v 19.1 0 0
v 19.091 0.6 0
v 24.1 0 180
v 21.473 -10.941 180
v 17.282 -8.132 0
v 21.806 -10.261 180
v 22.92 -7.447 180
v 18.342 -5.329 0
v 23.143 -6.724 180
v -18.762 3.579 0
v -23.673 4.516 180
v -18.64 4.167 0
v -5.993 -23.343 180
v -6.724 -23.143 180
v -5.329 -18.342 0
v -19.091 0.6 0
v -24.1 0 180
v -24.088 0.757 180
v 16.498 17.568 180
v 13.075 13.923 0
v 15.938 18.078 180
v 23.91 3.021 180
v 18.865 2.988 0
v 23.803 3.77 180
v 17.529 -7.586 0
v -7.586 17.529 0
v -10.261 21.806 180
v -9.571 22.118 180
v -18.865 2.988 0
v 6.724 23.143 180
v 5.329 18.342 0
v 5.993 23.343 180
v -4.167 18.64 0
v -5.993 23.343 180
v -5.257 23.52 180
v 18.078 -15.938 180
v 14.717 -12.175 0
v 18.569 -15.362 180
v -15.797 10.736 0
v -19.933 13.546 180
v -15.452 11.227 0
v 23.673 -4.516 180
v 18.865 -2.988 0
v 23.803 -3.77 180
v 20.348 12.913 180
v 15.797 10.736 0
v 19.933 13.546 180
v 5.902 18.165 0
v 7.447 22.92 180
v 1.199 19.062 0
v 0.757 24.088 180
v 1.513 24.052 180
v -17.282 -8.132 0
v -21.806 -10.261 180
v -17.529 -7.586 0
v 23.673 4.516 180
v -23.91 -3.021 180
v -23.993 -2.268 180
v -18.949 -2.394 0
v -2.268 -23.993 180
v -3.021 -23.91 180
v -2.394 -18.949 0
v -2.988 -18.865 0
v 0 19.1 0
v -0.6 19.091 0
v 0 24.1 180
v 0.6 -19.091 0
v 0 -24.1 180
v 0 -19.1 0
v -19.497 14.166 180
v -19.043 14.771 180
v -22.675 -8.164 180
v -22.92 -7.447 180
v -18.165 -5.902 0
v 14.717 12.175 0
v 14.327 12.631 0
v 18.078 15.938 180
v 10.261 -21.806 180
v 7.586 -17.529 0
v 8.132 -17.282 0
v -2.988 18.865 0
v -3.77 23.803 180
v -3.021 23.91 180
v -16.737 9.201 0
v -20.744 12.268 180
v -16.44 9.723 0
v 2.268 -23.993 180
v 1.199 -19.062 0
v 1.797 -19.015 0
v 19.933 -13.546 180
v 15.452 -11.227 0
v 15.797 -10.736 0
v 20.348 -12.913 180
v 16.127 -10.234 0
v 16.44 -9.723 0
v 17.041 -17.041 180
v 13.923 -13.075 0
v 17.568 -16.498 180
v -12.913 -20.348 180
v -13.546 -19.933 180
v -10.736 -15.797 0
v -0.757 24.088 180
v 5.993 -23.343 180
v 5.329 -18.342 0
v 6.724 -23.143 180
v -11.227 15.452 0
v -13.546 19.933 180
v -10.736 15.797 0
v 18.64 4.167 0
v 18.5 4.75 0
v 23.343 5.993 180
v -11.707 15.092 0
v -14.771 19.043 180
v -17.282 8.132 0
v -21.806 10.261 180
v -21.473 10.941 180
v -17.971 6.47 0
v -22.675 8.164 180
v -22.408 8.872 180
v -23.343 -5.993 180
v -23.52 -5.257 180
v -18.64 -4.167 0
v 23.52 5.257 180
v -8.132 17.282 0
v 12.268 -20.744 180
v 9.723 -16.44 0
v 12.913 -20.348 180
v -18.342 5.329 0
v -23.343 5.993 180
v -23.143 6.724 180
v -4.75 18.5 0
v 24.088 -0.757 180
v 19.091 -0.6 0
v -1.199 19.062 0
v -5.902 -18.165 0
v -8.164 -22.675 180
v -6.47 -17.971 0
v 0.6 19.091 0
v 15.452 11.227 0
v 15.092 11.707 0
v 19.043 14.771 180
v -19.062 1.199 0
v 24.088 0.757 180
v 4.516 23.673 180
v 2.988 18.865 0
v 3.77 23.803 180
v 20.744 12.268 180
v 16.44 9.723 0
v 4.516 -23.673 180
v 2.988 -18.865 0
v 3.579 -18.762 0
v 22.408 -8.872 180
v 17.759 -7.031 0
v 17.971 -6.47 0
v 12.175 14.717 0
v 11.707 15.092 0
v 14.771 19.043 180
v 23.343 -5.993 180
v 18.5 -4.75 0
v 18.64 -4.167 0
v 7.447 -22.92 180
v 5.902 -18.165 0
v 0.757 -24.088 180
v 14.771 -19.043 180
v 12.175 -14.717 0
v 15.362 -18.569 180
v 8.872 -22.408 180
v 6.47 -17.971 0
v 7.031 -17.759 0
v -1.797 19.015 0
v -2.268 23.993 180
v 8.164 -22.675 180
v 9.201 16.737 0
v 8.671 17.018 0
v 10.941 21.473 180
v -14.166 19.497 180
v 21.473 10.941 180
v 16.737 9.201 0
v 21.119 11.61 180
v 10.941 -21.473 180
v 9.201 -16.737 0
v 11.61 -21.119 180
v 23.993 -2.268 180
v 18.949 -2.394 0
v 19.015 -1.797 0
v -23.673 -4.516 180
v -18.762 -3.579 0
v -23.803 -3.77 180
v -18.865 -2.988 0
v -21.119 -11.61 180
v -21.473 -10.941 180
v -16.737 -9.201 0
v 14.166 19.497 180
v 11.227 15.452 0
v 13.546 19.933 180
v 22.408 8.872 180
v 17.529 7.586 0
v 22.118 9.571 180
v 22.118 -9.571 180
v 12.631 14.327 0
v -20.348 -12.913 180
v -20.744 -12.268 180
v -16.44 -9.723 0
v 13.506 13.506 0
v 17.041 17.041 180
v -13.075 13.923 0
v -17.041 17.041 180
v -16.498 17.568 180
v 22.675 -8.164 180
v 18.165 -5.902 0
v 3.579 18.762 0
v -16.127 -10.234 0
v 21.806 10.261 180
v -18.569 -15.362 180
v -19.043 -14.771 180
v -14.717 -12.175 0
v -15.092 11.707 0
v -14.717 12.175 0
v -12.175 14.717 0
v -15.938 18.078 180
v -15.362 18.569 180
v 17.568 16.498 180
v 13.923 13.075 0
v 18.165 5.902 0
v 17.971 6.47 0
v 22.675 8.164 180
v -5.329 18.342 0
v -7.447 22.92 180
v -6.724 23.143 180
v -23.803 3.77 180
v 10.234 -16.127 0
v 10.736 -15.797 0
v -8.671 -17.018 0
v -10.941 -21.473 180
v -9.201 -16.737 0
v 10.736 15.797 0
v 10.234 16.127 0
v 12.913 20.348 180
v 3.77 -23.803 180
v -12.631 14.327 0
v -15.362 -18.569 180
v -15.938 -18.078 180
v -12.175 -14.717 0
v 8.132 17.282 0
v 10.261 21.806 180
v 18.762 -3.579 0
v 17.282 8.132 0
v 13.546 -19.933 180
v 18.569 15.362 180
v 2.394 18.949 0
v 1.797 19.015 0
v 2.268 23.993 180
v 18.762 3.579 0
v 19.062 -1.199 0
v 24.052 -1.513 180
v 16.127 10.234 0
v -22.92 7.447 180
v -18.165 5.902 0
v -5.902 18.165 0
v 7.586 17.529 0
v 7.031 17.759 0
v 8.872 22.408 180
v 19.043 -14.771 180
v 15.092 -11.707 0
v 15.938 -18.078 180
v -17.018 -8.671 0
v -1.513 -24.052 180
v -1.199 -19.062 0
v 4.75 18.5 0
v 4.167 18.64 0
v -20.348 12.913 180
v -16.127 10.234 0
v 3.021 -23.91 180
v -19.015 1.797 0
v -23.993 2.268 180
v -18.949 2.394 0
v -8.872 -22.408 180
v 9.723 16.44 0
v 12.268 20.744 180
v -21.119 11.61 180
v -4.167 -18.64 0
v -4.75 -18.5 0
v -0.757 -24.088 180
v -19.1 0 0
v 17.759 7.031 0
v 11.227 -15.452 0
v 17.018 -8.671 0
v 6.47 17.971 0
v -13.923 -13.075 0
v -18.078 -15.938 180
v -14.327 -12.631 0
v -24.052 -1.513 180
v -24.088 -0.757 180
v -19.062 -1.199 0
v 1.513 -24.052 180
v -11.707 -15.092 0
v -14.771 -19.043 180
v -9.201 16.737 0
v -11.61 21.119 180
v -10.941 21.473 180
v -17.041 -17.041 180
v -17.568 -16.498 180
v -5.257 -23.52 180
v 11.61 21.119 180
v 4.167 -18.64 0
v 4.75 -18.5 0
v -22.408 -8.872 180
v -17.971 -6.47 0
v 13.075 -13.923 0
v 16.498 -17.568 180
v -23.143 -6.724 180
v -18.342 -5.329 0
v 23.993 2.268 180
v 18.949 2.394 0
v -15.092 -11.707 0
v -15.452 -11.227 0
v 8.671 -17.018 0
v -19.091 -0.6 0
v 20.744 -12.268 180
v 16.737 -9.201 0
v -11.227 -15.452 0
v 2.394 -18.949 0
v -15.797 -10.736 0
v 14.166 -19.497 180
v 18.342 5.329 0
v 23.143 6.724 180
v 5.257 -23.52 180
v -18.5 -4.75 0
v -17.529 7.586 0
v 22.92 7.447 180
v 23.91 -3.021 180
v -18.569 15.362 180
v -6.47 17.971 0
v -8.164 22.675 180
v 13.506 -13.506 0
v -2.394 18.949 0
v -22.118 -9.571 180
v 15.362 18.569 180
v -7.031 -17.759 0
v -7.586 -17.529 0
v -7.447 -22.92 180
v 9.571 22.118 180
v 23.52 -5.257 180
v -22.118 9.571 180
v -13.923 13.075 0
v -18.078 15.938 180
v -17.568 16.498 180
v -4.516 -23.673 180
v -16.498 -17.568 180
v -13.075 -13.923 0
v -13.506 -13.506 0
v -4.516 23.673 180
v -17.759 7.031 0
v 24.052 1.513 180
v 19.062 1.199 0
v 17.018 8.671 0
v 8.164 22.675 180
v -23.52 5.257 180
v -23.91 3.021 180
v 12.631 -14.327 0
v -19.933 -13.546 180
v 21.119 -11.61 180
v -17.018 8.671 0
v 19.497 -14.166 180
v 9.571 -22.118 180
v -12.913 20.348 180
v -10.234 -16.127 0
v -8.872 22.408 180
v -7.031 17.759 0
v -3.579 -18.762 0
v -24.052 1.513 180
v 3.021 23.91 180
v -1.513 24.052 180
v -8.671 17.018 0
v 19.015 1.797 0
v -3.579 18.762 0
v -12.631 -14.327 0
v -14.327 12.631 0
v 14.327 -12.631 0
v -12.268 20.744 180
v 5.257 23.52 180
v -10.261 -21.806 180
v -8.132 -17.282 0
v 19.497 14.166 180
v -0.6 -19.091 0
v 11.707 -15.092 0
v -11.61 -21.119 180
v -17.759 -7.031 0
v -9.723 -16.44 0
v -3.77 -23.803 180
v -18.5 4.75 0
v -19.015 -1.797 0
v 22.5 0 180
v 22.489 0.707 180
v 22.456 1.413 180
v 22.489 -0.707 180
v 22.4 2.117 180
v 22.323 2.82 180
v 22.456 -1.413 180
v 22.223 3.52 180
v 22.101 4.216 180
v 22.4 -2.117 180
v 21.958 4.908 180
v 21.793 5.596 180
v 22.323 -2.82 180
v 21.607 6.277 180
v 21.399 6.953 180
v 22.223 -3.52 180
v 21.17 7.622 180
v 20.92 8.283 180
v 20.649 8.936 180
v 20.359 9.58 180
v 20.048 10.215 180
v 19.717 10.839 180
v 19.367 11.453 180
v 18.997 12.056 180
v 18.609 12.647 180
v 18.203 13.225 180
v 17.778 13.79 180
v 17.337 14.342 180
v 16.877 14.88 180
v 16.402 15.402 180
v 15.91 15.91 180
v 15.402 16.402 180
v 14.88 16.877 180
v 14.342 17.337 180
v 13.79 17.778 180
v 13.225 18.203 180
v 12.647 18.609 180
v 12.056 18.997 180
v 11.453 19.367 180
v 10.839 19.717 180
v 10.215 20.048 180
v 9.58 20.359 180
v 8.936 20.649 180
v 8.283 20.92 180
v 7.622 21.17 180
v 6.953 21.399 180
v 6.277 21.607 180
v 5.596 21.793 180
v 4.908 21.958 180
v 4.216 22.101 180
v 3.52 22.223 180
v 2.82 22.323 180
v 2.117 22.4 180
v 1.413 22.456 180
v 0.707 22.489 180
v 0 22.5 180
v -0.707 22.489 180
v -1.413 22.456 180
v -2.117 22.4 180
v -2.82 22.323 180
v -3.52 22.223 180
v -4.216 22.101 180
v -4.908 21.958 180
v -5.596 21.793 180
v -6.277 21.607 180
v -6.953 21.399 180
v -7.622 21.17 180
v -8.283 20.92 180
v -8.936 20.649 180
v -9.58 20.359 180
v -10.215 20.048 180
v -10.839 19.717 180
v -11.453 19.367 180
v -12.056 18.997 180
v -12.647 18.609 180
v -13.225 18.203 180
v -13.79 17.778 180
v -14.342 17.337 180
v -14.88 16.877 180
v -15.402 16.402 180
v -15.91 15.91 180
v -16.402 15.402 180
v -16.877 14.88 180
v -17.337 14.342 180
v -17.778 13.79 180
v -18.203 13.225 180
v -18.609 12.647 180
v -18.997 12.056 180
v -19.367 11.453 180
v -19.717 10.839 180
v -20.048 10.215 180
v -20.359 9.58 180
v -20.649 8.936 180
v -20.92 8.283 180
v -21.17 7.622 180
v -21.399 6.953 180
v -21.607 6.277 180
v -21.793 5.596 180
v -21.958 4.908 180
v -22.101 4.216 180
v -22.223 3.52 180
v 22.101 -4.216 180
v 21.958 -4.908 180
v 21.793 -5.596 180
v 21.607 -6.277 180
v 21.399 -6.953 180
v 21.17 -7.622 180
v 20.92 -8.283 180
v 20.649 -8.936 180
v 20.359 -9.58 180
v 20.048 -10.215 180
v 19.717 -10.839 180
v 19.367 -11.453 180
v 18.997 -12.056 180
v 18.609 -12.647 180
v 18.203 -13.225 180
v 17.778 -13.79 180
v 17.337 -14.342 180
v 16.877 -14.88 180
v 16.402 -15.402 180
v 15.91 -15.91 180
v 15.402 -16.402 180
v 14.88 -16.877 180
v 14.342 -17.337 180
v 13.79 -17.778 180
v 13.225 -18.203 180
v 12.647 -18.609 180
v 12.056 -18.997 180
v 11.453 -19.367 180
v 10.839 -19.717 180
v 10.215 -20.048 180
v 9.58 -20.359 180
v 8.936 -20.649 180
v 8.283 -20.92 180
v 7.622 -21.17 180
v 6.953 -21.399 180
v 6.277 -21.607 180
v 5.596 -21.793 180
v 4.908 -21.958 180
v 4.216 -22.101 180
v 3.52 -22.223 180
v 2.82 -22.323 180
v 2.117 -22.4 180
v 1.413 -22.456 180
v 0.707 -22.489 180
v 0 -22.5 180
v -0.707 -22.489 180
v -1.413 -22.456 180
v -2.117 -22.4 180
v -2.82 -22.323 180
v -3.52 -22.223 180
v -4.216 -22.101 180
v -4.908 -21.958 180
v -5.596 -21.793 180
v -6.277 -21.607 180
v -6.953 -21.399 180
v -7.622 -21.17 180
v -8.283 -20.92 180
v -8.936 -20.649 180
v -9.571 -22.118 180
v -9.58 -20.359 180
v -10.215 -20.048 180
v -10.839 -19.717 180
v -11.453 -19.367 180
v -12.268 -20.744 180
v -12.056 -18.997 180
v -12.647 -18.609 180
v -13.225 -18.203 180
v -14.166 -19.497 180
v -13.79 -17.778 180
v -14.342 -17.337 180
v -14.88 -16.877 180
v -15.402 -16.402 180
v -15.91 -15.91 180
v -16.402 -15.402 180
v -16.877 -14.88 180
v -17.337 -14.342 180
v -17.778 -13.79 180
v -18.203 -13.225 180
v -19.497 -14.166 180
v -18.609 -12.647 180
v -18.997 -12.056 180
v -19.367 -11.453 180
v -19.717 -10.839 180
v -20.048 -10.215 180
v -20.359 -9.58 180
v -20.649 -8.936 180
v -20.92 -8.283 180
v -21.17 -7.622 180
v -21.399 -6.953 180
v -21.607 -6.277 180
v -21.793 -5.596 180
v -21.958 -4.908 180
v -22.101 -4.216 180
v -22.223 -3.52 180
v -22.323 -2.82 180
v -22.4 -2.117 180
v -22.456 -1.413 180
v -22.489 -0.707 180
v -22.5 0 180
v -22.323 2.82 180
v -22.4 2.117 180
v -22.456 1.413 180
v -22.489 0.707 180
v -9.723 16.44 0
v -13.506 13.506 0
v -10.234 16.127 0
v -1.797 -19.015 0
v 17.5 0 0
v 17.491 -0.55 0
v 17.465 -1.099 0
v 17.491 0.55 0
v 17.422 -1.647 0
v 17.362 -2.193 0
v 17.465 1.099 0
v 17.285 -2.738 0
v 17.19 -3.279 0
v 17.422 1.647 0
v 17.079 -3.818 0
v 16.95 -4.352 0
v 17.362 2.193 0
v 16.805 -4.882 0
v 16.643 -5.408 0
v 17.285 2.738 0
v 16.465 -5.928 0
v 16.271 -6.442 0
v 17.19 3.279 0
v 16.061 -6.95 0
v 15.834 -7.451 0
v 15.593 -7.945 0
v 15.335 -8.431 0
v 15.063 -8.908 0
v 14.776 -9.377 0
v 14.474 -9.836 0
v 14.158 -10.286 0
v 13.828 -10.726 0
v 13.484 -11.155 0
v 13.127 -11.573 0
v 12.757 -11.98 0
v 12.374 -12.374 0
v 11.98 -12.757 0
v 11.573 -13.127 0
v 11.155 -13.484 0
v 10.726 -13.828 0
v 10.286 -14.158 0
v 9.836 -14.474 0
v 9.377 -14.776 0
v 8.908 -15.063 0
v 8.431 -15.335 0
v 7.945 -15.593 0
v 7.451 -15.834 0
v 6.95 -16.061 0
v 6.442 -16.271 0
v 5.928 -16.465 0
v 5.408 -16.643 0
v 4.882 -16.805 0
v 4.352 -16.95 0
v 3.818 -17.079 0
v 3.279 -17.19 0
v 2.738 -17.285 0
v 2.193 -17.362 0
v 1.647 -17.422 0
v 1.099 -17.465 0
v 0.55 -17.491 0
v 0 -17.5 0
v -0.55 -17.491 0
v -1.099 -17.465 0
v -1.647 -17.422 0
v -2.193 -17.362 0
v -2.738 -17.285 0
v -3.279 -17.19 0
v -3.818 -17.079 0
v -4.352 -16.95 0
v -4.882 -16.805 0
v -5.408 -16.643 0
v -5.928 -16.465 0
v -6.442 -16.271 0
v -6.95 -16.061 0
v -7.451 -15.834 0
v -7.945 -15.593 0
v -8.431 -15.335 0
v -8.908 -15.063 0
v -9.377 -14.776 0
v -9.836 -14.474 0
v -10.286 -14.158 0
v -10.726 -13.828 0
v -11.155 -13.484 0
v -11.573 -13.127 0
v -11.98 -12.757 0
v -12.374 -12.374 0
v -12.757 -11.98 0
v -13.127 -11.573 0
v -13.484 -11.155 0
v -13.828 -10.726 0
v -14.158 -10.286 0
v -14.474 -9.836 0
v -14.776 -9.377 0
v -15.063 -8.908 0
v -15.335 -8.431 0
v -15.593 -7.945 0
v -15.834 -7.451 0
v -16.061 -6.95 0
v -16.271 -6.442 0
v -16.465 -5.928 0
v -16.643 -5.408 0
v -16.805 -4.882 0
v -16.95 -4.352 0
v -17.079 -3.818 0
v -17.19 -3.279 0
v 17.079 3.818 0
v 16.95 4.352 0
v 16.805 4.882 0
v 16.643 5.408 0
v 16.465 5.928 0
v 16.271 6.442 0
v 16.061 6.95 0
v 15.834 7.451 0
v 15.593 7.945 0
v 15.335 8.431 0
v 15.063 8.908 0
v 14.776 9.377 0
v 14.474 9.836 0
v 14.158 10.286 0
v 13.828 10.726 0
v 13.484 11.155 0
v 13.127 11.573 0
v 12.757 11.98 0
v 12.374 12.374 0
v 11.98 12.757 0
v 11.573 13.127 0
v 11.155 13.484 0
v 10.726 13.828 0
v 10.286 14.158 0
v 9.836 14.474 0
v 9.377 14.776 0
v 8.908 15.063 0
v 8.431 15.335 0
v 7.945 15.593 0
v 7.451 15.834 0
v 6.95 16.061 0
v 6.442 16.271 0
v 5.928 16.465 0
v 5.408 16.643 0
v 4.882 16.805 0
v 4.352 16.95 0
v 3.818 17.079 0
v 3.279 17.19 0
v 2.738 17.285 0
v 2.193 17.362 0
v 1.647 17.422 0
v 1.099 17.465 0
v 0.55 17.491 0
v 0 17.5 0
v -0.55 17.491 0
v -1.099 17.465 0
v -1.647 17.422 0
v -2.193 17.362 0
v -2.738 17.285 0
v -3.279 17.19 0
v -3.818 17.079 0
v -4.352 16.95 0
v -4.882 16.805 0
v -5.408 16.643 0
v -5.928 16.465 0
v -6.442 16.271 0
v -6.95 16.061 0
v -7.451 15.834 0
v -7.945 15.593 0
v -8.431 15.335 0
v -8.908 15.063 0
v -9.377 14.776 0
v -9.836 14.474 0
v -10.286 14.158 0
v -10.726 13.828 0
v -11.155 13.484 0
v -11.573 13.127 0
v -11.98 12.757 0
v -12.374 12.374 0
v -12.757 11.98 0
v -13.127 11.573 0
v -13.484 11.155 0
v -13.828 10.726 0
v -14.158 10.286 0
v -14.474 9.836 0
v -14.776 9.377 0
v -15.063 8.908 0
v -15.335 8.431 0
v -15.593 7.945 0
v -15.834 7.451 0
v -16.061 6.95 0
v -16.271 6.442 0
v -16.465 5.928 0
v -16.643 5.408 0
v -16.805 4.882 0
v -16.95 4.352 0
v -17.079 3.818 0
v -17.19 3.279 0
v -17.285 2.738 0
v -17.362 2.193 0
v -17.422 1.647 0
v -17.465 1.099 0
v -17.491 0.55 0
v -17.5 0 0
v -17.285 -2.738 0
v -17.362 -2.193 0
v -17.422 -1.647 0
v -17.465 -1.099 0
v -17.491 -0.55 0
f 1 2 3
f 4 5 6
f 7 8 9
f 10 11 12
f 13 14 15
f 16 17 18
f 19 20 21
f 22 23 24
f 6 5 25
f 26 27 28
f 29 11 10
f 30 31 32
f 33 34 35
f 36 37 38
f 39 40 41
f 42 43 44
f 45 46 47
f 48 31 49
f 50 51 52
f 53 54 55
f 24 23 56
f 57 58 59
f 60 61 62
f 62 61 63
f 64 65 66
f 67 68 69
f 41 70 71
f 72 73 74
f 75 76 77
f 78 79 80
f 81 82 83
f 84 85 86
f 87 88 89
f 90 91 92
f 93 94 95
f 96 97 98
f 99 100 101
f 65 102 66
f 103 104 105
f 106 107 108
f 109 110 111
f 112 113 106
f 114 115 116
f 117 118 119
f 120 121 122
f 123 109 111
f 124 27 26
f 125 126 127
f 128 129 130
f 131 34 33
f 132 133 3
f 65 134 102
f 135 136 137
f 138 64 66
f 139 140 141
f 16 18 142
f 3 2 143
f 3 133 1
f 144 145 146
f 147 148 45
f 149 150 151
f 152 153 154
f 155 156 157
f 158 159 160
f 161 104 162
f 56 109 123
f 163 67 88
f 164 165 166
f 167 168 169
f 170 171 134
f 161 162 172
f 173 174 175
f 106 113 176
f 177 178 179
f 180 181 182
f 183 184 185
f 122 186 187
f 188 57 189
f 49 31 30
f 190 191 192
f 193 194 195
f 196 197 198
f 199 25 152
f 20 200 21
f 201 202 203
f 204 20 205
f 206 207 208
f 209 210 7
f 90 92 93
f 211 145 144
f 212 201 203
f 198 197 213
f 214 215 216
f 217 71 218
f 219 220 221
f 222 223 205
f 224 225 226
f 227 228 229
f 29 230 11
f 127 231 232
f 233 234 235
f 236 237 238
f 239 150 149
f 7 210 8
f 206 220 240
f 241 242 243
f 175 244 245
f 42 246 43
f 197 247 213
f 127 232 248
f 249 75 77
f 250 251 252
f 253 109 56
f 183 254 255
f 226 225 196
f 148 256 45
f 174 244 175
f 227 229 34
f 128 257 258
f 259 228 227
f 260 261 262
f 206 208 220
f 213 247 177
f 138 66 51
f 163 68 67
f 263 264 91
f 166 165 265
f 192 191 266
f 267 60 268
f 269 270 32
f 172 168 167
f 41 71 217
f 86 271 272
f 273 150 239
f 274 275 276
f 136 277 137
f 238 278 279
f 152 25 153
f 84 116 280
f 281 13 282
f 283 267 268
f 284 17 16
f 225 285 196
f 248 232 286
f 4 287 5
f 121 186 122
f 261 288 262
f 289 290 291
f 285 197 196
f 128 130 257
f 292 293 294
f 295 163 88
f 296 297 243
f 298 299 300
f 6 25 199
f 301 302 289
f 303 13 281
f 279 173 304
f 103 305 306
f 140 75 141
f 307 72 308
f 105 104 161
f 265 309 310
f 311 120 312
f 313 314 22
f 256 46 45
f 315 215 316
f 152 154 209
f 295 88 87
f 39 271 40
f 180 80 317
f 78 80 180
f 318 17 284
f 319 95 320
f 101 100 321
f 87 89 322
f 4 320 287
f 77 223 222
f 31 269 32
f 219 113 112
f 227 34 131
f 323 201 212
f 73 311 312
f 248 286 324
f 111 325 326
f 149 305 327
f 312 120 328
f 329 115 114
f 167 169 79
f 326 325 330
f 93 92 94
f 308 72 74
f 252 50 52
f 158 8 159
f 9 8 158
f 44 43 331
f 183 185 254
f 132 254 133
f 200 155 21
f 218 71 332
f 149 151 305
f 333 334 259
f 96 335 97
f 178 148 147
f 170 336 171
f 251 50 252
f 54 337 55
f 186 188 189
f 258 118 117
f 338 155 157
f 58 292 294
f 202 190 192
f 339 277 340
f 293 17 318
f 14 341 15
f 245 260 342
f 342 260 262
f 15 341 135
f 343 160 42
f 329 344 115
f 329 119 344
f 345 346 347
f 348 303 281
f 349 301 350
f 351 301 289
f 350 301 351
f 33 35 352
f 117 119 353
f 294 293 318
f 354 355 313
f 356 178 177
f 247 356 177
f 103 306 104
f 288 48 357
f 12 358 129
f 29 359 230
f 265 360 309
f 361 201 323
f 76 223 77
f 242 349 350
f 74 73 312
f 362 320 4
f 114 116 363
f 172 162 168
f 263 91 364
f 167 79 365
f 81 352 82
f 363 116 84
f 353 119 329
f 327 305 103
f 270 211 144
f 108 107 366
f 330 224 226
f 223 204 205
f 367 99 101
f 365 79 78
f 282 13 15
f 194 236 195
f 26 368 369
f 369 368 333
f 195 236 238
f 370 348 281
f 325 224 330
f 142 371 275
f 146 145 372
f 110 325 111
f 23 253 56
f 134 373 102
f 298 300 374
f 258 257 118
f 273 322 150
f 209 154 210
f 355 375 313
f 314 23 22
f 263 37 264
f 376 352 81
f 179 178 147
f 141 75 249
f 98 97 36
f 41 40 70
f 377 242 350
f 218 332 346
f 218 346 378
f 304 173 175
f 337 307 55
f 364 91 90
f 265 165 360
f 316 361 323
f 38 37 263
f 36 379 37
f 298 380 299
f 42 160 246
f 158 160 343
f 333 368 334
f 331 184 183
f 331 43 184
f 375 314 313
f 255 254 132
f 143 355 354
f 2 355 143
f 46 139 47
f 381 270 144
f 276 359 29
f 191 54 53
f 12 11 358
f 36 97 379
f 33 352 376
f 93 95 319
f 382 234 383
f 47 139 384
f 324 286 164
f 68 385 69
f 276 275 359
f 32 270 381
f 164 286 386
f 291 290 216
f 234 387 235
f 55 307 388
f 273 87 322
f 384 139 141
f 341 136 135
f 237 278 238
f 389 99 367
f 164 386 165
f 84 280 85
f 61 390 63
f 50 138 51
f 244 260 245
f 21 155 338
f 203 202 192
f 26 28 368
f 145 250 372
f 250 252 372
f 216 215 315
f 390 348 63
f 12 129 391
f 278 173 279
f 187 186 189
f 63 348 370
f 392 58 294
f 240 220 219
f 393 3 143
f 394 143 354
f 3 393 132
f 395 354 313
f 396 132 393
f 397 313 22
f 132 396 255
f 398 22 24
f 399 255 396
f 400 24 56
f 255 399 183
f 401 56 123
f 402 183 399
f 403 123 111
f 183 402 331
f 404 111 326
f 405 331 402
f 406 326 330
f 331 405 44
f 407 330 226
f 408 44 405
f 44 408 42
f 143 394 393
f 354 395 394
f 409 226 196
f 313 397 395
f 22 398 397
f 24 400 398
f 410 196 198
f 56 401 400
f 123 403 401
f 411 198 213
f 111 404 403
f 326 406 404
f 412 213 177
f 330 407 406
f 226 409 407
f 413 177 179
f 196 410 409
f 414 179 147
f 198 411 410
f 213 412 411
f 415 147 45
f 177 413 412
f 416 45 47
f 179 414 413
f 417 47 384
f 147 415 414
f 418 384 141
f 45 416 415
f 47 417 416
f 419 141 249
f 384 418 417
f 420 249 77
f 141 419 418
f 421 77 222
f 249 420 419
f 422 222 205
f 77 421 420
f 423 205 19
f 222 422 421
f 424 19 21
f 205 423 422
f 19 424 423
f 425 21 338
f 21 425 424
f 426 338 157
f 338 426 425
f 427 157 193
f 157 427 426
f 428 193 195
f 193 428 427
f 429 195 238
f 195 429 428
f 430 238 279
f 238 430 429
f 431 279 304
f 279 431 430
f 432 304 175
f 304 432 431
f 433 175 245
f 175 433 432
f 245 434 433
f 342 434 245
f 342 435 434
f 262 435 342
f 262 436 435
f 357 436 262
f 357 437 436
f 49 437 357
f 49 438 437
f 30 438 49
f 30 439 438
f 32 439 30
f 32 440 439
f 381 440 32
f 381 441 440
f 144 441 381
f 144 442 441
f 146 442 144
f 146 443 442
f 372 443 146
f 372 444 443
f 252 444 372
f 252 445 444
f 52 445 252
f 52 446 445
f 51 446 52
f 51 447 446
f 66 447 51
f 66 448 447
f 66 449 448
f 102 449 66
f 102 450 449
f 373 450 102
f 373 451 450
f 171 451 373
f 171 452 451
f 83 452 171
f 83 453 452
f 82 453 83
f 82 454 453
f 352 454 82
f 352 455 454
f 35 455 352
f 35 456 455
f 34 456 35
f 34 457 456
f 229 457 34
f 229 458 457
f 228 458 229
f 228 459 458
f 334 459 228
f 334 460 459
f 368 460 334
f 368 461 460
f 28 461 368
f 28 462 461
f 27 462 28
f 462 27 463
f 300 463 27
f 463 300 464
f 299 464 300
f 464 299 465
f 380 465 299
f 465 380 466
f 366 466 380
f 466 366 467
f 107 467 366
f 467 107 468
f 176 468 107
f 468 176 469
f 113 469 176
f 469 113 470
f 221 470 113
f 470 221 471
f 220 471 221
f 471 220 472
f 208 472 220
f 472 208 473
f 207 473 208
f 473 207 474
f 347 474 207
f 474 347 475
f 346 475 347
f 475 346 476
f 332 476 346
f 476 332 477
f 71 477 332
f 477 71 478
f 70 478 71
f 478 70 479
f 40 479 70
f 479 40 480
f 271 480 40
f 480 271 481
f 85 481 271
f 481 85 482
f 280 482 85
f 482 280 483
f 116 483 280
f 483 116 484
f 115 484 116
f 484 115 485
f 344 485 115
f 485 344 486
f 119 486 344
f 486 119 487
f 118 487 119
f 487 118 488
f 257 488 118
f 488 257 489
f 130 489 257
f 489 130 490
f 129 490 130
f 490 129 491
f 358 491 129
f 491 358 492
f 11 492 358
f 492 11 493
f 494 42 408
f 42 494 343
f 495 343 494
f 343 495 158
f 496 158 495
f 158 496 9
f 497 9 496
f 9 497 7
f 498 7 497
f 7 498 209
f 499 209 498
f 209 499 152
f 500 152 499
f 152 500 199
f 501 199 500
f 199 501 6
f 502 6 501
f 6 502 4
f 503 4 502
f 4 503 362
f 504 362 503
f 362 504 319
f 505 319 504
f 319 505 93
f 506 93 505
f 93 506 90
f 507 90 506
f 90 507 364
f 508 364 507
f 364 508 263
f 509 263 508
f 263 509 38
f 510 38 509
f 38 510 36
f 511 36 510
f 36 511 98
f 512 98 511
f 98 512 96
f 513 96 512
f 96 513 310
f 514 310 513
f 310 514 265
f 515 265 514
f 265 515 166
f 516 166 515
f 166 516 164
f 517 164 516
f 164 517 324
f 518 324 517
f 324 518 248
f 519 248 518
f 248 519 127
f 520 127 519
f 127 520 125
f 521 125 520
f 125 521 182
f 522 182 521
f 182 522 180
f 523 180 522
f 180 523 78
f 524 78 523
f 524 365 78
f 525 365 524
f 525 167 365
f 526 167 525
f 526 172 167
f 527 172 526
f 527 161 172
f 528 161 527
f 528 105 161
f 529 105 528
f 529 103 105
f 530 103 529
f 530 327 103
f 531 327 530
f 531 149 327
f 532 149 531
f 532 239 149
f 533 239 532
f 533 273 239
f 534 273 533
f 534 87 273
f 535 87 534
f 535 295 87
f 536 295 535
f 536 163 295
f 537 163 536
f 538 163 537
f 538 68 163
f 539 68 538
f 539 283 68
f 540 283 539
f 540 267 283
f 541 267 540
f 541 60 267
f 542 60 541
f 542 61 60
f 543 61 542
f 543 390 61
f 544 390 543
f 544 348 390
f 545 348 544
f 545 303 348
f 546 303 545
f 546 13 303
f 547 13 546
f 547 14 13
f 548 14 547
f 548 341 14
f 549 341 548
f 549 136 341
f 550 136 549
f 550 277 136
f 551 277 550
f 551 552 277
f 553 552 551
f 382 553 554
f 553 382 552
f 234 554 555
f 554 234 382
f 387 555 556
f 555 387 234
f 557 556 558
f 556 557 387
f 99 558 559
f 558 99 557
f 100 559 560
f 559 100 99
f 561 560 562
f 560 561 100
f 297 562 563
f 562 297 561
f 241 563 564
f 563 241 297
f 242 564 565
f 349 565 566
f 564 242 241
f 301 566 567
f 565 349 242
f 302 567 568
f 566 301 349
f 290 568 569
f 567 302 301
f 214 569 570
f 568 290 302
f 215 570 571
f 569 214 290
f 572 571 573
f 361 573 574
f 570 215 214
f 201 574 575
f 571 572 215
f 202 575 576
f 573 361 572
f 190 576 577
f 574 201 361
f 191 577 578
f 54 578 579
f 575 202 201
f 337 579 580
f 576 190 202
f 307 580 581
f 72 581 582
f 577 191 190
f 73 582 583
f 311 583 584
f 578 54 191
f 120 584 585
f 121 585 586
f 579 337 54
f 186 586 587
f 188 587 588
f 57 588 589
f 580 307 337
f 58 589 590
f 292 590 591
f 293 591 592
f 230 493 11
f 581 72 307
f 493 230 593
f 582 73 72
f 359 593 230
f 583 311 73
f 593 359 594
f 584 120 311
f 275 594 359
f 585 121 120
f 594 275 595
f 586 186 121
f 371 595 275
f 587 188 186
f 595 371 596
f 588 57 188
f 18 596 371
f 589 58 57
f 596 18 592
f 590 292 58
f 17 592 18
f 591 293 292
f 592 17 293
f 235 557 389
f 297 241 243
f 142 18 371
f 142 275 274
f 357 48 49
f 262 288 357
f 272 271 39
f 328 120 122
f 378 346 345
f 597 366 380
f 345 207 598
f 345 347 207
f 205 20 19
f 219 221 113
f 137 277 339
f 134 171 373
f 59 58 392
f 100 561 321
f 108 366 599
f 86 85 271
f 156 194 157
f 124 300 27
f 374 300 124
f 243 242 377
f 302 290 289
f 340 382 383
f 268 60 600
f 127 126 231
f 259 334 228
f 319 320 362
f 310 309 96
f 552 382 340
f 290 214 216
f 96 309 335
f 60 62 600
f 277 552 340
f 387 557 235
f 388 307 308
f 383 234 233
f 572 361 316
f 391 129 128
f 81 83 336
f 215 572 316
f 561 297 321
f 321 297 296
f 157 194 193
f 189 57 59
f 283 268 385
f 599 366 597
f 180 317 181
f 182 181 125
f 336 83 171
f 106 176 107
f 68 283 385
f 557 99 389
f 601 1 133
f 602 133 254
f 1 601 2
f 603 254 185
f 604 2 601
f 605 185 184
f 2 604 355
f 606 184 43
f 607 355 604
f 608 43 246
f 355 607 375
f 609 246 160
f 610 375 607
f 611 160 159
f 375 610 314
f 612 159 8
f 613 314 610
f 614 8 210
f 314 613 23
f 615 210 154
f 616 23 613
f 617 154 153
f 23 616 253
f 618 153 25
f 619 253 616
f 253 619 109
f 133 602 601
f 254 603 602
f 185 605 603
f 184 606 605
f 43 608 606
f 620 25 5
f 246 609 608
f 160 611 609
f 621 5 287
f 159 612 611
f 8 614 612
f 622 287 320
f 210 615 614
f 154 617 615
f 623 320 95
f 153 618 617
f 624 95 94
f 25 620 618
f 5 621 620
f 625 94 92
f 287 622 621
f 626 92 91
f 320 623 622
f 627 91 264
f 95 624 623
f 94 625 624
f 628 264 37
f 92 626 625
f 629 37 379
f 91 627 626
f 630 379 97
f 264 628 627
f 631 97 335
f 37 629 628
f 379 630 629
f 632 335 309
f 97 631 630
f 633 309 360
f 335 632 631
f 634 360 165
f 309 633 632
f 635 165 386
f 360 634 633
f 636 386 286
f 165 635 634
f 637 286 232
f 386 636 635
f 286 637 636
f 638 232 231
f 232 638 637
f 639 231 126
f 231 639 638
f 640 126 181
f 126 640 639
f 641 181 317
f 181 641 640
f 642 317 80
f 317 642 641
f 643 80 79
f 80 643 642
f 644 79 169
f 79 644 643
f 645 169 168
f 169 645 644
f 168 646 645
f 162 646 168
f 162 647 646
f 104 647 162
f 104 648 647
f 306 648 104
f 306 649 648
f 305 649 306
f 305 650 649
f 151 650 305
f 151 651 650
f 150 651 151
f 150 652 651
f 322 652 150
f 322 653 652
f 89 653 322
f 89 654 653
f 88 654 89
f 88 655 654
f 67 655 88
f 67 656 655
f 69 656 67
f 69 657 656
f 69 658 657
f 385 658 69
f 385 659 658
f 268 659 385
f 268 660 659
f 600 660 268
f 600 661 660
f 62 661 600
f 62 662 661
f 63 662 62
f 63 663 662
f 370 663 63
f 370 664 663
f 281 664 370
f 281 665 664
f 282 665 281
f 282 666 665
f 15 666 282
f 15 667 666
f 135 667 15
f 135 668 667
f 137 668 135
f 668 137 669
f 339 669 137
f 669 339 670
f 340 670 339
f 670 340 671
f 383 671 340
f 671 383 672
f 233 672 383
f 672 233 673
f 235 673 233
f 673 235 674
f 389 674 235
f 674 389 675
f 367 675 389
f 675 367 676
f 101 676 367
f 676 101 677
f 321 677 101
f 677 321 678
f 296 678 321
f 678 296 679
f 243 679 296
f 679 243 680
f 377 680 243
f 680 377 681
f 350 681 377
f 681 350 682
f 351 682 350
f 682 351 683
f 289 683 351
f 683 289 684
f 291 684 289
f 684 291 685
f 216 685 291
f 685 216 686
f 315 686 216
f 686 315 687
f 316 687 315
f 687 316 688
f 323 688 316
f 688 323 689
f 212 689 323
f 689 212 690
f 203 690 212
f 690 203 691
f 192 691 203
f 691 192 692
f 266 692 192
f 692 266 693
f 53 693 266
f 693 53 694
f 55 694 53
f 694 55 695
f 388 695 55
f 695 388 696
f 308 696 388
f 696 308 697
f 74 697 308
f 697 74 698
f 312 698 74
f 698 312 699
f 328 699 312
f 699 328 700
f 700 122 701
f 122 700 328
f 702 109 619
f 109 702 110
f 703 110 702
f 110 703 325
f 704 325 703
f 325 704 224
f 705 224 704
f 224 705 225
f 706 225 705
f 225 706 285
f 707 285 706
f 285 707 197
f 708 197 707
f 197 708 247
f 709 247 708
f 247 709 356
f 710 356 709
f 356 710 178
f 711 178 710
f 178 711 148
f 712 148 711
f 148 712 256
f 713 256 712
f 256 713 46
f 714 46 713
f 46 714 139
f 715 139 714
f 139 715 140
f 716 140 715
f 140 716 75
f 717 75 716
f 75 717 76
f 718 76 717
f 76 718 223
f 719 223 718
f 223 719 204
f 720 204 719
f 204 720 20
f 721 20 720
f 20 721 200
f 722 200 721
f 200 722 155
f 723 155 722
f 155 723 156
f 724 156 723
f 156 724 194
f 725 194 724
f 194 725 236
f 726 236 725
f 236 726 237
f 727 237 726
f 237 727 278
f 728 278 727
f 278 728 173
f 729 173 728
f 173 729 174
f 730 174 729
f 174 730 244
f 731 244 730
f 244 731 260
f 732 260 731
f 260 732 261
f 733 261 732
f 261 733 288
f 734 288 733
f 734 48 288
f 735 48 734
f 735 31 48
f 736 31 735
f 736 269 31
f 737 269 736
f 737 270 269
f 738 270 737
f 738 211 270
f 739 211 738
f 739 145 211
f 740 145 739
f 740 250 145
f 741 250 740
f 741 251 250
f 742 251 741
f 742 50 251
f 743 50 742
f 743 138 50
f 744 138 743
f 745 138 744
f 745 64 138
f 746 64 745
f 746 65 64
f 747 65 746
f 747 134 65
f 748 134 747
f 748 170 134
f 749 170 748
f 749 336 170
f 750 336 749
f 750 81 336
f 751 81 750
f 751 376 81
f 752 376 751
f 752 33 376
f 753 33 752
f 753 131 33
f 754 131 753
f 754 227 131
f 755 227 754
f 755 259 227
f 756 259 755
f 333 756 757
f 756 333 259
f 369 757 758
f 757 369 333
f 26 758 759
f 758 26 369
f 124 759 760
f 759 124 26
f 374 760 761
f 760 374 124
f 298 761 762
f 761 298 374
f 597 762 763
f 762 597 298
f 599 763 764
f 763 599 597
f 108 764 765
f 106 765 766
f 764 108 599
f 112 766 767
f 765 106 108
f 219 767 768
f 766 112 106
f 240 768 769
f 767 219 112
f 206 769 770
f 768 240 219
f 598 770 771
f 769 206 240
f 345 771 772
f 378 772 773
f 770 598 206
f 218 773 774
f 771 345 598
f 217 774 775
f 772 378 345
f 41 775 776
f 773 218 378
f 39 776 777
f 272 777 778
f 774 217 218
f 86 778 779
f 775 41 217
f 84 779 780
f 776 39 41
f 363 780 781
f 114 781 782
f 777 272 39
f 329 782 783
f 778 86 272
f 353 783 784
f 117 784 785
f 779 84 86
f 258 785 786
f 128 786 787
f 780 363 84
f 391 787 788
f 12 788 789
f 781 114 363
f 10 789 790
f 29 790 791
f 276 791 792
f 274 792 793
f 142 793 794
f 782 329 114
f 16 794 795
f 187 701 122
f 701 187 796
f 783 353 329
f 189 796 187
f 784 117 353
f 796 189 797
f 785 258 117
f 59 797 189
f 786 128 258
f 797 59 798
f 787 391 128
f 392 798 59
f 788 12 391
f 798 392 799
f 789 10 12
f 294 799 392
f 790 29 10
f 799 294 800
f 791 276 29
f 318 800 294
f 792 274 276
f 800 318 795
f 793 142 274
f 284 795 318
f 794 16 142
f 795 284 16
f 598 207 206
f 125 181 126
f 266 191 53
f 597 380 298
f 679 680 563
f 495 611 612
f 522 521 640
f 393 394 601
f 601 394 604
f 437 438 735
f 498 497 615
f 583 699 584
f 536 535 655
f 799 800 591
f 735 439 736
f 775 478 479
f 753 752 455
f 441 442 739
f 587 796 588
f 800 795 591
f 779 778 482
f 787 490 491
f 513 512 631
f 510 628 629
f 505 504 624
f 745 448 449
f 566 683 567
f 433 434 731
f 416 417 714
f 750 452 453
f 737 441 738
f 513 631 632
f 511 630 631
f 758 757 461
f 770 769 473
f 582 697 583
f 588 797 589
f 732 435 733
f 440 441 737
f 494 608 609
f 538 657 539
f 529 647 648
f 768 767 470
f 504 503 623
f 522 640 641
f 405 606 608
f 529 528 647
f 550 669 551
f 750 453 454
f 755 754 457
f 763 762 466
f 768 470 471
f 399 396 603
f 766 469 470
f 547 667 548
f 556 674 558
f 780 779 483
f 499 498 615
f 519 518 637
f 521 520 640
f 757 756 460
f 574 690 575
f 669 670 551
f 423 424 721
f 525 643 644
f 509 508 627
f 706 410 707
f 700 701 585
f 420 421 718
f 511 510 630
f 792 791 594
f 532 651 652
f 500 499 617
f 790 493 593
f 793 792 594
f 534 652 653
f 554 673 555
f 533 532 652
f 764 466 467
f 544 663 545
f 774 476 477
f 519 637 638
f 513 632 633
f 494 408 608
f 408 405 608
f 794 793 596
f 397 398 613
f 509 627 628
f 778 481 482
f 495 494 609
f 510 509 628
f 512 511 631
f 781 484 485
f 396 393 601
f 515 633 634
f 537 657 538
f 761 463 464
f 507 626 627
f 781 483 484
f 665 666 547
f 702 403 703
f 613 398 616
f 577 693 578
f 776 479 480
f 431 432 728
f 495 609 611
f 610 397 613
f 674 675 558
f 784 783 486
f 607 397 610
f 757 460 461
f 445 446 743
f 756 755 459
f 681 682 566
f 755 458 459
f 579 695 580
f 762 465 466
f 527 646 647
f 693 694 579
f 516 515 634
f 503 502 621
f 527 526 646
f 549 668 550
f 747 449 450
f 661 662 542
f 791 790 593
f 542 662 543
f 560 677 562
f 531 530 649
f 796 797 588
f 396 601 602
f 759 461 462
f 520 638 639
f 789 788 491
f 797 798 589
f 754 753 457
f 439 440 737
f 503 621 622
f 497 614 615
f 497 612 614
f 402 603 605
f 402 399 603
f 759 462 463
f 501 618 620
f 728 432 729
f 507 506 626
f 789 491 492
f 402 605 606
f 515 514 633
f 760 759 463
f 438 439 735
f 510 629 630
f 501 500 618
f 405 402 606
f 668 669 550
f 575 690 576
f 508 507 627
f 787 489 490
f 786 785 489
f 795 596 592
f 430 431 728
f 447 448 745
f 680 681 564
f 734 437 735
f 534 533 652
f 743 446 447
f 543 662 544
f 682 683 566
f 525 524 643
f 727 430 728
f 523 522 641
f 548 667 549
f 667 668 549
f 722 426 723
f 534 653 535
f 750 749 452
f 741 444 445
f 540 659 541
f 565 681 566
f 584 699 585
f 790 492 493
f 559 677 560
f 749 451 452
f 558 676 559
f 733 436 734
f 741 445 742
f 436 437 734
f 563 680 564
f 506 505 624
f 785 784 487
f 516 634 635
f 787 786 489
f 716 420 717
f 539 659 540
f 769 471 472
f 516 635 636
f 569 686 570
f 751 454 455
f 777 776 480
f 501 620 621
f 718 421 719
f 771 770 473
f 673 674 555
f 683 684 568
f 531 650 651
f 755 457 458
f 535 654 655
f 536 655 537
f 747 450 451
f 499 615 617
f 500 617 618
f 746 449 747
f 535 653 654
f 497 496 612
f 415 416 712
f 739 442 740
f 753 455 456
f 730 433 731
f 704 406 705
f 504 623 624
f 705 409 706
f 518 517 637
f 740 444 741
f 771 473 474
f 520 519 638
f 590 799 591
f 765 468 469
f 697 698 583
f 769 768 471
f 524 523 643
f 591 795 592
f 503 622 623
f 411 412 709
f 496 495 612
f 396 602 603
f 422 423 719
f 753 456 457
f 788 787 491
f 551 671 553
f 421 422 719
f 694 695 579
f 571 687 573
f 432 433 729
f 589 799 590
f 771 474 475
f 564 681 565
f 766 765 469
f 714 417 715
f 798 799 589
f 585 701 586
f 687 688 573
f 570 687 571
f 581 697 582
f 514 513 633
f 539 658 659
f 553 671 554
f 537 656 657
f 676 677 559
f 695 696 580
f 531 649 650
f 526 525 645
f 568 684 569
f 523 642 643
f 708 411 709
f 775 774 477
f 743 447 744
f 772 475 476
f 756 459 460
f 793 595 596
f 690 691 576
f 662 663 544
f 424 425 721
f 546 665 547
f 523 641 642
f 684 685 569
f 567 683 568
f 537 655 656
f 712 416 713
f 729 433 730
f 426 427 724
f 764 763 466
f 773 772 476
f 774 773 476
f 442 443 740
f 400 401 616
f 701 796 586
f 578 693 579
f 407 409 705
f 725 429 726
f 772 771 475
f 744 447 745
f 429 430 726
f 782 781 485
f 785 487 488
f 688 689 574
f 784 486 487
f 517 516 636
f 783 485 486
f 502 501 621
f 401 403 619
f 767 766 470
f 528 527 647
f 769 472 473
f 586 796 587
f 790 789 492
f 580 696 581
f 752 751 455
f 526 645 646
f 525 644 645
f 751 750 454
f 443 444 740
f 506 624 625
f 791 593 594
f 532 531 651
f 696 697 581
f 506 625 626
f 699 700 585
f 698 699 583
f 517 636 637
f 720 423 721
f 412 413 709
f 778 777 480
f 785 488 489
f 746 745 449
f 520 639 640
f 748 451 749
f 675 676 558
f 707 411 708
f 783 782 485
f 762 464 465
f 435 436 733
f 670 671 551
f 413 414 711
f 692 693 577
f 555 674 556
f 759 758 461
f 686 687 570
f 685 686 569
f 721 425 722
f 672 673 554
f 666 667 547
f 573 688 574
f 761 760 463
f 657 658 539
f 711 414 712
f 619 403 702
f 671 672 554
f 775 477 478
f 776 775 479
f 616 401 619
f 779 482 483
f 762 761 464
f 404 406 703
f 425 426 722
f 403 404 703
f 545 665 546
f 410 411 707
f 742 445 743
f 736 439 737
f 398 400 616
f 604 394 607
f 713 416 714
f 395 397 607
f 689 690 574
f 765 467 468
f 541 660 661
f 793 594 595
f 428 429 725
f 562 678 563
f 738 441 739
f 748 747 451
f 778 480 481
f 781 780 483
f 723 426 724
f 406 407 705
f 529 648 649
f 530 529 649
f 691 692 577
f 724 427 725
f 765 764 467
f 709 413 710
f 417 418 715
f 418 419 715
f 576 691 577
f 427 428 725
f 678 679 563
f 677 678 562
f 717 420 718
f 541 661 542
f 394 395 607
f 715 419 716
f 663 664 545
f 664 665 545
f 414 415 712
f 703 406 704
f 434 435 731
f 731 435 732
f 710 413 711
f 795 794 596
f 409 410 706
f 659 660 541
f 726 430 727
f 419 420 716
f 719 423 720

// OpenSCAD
//Sheat
sheatThickness = 1.6;


//Main cone and mold
h = 180; //Cone height
maxDiam = 45; //Cone
minDiam = 35; //Cone
centerSolidDiam=15;
moldWallThickness = 3;
footDiam=100; //Foot for mold
siliconeThickness=3; //Outer
dividersThickness = 5;
////Assembly on the sides of mold////
numberOfHoles = 4;
screwSize=5;
assemblyWidth= 22;

//Bottom
straightHeightBottom = 20;
bottomThickness=3.5;
LDRHolderThickness= 10;
LDRHolderDiam= minDiam+3;
delta=0.4; //Inaccuracy of printer (layering and overextrusion)
LDRHoleDepth=8;//NOT MEASURED
LDRHolderThickness = 8 +2.5;
LDRDiam=6; //NOT MEASURED
LDRWireHolesDist=3;//NOT MEASURED distance between wires on LDR
LDRHoleDist=LDRHolderDiam/2-LDRDiam;
LDRNumber=3;

//Top part
straightHeight= 30; 
wiresDiameter=5; 

//Joints
jointThickness = 3;

//Assembly
numberOfHoles = 4;
screwSize=5;


//Finishing mold:
finMoldHeight=25;
finMoldWidth=30;
supportMoldLength=60;
supportMoldWidth=30;
FinalBottomThickness =8;

$fn=200;

//Main cone
difference(){
cylinder(h,d2=maxDiam+sheatThickness*2,d1=minDiam+sheatThickness*2);
cylinder(h,d2=maxDiam,d1=minDiam);

}
